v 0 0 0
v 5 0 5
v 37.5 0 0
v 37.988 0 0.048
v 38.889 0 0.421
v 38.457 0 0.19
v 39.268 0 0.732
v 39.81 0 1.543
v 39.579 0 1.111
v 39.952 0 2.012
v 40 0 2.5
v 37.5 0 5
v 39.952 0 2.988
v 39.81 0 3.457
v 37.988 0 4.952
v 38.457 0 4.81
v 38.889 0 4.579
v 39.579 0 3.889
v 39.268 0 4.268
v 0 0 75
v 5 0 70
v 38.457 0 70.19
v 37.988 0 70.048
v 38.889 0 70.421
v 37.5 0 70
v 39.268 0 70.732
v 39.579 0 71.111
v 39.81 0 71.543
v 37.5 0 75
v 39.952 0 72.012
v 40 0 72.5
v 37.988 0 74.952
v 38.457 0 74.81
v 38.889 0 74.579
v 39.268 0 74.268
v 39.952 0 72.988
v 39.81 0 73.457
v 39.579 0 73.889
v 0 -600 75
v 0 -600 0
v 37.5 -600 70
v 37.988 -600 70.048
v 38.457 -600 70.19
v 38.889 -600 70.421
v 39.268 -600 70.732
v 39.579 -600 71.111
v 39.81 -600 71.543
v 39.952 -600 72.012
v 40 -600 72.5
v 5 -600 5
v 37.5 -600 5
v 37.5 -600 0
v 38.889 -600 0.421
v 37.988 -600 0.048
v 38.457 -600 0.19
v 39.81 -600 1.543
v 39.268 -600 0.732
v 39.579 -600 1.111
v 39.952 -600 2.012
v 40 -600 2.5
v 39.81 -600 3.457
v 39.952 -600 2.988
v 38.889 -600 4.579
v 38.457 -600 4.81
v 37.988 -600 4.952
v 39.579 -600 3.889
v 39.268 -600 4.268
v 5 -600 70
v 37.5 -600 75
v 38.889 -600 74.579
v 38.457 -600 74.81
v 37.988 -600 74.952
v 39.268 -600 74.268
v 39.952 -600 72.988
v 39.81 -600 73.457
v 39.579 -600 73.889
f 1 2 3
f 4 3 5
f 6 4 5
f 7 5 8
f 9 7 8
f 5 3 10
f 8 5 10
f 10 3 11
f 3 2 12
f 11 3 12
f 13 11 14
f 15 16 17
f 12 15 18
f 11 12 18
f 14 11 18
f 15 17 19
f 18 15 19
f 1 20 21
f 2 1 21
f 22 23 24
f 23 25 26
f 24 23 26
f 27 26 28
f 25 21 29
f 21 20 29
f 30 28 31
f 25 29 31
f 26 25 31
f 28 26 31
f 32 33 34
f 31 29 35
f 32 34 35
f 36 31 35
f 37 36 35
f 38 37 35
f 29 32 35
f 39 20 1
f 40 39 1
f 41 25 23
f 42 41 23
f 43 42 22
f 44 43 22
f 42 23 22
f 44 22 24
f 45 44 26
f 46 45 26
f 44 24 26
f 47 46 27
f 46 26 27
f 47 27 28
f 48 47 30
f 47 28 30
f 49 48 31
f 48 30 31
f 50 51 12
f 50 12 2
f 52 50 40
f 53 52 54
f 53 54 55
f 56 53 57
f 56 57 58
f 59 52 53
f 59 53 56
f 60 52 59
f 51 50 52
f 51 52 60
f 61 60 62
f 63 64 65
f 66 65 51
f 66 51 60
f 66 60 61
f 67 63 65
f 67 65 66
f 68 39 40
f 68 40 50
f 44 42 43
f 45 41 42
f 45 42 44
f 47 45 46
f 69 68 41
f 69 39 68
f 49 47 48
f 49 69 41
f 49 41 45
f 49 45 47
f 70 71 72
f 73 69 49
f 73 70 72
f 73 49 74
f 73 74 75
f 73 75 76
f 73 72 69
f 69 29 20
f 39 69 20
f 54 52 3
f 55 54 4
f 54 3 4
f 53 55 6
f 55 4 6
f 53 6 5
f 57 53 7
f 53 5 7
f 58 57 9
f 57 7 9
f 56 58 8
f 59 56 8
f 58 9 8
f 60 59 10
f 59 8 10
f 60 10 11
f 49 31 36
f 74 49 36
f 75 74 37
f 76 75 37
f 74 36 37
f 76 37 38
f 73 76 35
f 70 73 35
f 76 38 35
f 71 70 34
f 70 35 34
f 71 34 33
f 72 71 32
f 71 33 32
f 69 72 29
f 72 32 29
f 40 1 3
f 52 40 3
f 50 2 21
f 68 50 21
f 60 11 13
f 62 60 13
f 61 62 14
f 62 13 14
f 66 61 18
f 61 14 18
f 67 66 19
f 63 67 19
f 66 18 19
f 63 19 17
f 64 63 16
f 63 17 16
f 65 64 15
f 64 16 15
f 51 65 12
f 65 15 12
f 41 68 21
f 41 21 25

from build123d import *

# Parameters (mm, degrees)
F1_DEPTH = 600


with BuildPart() as f1:
    # F0 (on Front) → F1 (new body)
    with BuildSketch(Plane.XZ):
        with BuildLine():
            Line((0, 75), (0, 0))
            Line((0, 0), (37.5, 0))
            ThreePointArc((37.5, 0), (39.267767, 0.732233), (40, 2.5))
            ThreePointArc((40, 2.5), (39.267767, 4.267767), (37.5, 5))
            Line((37.5, 5), (5, 5))
            Line((5, 5), (5, 70))
            Line((5, 70), (37.5, 70))
            ThreePointArc((37.5, 70), (39.267767, 70.732233), (40, 72.5))
            ThreePointArc((40, 72.5), (39.267767, 74.267767), (37.5, 75))
            Line((37.5, 75), (0, 75))
        make_face()
    extrude(amount=F1_DEPTH)


solid = f1.part
